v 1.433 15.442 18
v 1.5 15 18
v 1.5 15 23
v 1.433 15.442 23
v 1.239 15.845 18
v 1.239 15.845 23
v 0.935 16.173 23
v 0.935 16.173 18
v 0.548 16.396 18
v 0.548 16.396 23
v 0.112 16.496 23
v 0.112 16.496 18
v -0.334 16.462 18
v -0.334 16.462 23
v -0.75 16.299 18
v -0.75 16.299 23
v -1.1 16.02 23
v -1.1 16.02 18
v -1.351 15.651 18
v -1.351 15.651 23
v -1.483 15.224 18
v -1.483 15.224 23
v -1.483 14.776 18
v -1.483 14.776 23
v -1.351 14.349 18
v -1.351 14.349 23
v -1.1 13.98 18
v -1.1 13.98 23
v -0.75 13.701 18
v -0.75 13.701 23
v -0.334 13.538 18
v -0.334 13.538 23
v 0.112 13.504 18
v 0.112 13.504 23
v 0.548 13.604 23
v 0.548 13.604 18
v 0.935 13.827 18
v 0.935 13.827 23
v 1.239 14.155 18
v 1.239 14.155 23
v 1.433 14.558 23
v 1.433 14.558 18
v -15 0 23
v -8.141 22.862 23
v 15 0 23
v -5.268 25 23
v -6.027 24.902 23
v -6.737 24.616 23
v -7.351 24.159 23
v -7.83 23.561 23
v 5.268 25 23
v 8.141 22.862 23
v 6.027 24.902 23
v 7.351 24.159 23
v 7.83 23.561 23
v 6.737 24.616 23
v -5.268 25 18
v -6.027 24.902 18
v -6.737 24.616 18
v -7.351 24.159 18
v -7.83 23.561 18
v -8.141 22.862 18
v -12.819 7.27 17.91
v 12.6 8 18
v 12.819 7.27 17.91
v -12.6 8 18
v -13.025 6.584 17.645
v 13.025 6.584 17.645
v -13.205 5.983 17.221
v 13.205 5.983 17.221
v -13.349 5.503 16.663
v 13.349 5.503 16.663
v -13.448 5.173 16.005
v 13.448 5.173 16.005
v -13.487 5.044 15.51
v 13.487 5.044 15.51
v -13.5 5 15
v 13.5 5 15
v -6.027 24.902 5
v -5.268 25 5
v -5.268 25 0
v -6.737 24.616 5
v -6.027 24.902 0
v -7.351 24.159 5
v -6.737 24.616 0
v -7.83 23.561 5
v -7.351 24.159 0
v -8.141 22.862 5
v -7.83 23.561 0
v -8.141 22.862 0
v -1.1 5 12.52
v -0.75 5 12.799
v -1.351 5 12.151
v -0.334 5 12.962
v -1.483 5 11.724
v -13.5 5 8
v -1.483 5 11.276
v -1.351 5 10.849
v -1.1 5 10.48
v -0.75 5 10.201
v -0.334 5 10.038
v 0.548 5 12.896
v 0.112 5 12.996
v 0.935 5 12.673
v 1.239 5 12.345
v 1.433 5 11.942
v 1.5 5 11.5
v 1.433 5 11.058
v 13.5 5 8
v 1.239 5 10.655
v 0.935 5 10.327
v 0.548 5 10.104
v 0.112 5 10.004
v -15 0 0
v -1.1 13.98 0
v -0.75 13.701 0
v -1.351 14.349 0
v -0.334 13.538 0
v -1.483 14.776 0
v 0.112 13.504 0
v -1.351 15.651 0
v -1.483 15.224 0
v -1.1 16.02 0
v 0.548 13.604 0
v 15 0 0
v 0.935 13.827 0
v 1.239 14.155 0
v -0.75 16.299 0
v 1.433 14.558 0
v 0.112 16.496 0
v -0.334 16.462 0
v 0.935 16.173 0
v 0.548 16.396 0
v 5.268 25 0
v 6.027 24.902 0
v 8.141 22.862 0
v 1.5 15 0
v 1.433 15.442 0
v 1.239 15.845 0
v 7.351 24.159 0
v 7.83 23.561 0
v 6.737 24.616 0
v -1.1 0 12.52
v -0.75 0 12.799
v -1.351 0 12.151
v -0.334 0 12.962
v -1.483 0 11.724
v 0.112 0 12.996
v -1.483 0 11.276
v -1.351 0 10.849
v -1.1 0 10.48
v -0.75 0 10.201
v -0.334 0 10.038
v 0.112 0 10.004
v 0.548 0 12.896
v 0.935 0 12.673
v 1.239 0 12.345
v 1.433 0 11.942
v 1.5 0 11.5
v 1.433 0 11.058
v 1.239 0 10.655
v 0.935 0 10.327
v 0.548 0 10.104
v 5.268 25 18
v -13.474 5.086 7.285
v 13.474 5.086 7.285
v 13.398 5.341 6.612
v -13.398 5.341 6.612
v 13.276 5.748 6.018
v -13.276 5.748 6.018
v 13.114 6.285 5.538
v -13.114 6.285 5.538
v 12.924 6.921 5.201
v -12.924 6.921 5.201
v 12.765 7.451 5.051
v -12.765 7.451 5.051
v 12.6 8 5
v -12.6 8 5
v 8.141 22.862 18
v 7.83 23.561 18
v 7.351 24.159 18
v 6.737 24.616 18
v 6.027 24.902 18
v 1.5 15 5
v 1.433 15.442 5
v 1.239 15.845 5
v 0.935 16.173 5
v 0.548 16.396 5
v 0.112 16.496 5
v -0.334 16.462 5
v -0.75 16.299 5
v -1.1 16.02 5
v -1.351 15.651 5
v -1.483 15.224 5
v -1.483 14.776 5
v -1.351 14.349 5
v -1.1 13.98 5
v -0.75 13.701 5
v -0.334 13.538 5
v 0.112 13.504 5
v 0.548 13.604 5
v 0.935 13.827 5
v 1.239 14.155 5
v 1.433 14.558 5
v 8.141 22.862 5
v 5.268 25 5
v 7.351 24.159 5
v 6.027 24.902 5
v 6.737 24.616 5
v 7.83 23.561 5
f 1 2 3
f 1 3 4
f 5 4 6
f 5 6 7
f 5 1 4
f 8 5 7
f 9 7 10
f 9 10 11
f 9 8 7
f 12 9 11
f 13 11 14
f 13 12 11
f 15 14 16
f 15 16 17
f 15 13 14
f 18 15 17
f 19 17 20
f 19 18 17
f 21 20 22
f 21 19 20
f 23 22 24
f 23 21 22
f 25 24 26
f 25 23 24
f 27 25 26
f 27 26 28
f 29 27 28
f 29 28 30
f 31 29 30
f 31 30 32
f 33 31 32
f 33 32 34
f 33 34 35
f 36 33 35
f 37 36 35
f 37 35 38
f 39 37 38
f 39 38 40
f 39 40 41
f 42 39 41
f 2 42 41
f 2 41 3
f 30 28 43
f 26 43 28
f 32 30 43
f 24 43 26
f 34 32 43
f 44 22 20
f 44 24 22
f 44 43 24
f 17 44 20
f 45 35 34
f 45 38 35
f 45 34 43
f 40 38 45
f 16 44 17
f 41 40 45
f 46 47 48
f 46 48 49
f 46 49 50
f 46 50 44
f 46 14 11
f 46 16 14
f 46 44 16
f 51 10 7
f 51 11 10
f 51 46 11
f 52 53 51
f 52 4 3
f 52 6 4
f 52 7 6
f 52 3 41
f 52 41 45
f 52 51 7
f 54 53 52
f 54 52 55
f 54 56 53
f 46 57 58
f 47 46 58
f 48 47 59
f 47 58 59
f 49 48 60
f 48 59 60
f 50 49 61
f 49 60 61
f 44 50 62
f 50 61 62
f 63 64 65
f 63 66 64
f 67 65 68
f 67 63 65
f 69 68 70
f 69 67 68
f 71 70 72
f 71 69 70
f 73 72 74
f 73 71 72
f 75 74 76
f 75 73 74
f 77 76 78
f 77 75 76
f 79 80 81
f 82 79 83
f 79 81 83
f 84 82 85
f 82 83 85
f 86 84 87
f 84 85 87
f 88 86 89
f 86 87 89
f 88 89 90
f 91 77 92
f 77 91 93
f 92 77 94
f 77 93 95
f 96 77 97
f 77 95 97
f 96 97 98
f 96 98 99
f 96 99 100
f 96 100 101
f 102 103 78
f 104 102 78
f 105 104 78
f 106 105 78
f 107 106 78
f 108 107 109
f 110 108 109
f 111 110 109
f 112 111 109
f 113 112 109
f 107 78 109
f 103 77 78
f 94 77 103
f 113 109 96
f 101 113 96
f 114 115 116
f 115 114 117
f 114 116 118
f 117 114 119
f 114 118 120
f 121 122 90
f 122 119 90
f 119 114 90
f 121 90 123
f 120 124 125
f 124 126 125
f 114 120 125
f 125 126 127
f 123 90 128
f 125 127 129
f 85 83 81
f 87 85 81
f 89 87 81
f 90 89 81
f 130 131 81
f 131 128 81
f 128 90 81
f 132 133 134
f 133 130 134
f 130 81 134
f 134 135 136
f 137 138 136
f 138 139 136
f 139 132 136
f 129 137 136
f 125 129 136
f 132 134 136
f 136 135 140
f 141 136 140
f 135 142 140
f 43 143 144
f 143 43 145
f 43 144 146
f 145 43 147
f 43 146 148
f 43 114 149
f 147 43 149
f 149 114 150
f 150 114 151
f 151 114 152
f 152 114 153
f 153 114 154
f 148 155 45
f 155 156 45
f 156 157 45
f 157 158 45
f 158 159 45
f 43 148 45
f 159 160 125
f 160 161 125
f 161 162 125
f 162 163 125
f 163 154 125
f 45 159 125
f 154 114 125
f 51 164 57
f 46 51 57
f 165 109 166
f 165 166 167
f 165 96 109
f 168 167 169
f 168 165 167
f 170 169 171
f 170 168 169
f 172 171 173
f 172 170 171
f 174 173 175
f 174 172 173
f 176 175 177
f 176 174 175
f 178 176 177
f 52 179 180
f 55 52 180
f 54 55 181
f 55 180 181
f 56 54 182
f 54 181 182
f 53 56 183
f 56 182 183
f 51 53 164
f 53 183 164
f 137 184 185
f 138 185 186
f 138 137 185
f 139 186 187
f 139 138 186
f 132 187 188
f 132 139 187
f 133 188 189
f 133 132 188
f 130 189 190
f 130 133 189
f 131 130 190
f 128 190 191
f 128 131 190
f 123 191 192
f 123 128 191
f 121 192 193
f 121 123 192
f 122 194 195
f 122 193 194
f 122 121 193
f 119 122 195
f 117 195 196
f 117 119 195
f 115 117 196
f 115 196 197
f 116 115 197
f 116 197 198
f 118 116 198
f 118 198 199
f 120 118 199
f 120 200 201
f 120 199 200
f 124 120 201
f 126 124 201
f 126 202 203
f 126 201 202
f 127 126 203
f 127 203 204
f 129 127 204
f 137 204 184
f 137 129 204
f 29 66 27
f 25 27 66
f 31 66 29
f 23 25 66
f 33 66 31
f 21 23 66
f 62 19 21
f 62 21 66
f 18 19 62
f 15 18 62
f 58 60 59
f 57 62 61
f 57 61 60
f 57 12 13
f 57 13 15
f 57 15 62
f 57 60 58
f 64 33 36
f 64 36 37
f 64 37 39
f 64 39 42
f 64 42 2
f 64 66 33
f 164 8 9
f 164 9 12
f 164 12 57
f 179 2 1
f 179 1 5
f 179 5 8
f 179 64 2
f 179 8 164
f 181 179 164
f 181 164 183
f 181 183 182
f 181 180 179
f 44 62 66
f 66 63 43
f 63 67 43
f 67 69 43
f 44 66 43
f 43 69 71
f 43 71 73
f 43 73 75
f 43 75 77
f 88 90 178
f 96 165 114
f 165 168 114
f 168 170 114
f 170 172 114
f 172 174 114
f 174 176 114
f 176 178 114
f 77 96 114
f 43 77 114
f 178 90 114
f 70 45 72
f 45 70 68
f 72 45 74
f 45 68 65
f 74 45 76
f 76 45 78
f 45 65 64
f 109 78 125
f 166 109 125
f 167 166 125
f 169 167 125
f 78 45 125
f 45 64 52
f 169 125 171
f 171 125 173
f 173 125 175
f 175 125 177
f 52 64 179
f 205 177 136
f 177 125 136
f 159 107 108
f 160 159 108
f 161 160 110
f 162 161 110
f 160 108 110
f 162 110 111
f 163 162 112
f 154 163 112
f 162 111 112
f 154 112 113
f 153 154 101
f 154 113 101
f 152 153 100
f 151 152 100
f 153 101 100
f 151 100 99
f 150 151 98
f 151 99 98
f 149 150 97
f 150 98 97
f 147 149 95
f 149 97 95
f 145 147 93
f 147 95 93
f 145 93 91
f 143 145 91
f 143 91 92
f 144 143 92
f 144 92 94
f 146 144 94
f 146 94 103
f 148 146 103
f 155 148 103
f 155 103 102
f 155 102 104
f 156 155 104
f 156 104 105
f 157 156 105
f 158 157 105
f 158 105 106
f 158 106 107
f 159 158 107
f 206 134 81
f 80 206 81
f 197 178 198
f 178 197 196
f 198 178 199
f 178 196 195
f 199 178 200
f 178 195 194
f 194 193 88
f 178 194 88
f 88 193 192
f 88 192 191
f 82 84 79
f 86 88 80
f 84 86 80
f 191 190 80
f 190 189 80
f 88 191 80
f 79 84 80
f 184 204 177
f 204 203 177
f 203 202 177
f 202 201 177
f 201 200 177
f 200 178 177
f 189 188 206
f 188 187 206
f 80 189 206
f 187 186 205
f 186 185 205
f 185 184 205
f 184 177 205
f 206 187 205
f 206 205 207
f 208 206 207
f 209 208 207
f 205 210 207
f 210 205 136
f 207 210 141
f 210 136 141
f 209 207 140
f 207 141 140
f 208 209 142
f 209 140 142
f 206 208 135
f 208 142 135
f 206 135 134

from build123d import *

# Parameters (mm, degrees)
SKETCH1_R               = 1.5
BOSS_EXTRUDE1_DEPTH     = 23
SKETCH2_W               = 13
SKETCH2_H               = 23.129290295
CUT_EXTRUDE1_DEPTH      = 16
CUT_EXTRUDE1_DEPTH_BACK = 16
FILLET1_R               = 3
SKETCH3_R               = 1.5
CUT_EXTRUDE2_DEPTH      = 6


with BuildPart() as part:
    # Sketch1 → Boss-Extrude1 (new body)
    with BuildSketch(Plane.XY):
        with BuildLine():
            Line((-15, 0), (15, 0))
            Line((15, 0), (8.141386903, 22.862043657))
            ThreePointArc((8.141386903, 22.862043657), (7.058699636, 24.406878785), (5.267908047, 25))
            Line((5.267908047, 25), (-5.267908047, 25))
            ThreePointArc((-5.267908047, 25), (-7.058699636, 24.406878785), (-8.141386903, 22.862043657))
            Line((-8.141386903, 22.862043657), (-15, 0))
        make_face()
        with Locations((0, 15)):
            Circle(SKETCH1_R, mode=Mode.SUBTRACT)
    extrude(amount=BOSS_EXTRUDE1_DEPTH)

    # Sketch2 → Cut-Extrude1 (cut, two sides)
    with BuildSketch(Plane(origin=(0, 0, 0), x_dir=(0, 0, -1), z_dir=(1, 0, 0))) as cut_extrude1_sk:
        with Locations((-11.5, 16.564645148)):
            Rectangle(SKETCH2_W, SKETCH2_H)
    extrude(amount=CUT_EXTRUDE1_DEPTH, mode=Mode.SUBTRACT)
    extrude(cut_extrude1_sk.sketch, amount=-CUT_EXTRUDE1_DEPTH_BACK, mode=Mode.SUBTRACT)

    # Fillet1
    fillet1_edges = [part.edges().sort_by_distance(p)[0] for p in [
        (0, 5, 5),
        (0, 5, 18),
    ]]
    fillet(fillet1_edges, radius=FILLET1_R)

    # Sketch3 → Cut-Extrude2 (cut, through all)
    with BuildSketch(Plane(origin=(0, 5, 0), x_dir=(1, 0, 0), z_dir=(0, 1, 0))):
        with Locations((0, -11.5)):
            Circle(SKETCH3_R)
    extrude(amount=-CUT_EXTRUDE2_DEPTH, mode=Mode.SUBTRACT)


solid = part.part
